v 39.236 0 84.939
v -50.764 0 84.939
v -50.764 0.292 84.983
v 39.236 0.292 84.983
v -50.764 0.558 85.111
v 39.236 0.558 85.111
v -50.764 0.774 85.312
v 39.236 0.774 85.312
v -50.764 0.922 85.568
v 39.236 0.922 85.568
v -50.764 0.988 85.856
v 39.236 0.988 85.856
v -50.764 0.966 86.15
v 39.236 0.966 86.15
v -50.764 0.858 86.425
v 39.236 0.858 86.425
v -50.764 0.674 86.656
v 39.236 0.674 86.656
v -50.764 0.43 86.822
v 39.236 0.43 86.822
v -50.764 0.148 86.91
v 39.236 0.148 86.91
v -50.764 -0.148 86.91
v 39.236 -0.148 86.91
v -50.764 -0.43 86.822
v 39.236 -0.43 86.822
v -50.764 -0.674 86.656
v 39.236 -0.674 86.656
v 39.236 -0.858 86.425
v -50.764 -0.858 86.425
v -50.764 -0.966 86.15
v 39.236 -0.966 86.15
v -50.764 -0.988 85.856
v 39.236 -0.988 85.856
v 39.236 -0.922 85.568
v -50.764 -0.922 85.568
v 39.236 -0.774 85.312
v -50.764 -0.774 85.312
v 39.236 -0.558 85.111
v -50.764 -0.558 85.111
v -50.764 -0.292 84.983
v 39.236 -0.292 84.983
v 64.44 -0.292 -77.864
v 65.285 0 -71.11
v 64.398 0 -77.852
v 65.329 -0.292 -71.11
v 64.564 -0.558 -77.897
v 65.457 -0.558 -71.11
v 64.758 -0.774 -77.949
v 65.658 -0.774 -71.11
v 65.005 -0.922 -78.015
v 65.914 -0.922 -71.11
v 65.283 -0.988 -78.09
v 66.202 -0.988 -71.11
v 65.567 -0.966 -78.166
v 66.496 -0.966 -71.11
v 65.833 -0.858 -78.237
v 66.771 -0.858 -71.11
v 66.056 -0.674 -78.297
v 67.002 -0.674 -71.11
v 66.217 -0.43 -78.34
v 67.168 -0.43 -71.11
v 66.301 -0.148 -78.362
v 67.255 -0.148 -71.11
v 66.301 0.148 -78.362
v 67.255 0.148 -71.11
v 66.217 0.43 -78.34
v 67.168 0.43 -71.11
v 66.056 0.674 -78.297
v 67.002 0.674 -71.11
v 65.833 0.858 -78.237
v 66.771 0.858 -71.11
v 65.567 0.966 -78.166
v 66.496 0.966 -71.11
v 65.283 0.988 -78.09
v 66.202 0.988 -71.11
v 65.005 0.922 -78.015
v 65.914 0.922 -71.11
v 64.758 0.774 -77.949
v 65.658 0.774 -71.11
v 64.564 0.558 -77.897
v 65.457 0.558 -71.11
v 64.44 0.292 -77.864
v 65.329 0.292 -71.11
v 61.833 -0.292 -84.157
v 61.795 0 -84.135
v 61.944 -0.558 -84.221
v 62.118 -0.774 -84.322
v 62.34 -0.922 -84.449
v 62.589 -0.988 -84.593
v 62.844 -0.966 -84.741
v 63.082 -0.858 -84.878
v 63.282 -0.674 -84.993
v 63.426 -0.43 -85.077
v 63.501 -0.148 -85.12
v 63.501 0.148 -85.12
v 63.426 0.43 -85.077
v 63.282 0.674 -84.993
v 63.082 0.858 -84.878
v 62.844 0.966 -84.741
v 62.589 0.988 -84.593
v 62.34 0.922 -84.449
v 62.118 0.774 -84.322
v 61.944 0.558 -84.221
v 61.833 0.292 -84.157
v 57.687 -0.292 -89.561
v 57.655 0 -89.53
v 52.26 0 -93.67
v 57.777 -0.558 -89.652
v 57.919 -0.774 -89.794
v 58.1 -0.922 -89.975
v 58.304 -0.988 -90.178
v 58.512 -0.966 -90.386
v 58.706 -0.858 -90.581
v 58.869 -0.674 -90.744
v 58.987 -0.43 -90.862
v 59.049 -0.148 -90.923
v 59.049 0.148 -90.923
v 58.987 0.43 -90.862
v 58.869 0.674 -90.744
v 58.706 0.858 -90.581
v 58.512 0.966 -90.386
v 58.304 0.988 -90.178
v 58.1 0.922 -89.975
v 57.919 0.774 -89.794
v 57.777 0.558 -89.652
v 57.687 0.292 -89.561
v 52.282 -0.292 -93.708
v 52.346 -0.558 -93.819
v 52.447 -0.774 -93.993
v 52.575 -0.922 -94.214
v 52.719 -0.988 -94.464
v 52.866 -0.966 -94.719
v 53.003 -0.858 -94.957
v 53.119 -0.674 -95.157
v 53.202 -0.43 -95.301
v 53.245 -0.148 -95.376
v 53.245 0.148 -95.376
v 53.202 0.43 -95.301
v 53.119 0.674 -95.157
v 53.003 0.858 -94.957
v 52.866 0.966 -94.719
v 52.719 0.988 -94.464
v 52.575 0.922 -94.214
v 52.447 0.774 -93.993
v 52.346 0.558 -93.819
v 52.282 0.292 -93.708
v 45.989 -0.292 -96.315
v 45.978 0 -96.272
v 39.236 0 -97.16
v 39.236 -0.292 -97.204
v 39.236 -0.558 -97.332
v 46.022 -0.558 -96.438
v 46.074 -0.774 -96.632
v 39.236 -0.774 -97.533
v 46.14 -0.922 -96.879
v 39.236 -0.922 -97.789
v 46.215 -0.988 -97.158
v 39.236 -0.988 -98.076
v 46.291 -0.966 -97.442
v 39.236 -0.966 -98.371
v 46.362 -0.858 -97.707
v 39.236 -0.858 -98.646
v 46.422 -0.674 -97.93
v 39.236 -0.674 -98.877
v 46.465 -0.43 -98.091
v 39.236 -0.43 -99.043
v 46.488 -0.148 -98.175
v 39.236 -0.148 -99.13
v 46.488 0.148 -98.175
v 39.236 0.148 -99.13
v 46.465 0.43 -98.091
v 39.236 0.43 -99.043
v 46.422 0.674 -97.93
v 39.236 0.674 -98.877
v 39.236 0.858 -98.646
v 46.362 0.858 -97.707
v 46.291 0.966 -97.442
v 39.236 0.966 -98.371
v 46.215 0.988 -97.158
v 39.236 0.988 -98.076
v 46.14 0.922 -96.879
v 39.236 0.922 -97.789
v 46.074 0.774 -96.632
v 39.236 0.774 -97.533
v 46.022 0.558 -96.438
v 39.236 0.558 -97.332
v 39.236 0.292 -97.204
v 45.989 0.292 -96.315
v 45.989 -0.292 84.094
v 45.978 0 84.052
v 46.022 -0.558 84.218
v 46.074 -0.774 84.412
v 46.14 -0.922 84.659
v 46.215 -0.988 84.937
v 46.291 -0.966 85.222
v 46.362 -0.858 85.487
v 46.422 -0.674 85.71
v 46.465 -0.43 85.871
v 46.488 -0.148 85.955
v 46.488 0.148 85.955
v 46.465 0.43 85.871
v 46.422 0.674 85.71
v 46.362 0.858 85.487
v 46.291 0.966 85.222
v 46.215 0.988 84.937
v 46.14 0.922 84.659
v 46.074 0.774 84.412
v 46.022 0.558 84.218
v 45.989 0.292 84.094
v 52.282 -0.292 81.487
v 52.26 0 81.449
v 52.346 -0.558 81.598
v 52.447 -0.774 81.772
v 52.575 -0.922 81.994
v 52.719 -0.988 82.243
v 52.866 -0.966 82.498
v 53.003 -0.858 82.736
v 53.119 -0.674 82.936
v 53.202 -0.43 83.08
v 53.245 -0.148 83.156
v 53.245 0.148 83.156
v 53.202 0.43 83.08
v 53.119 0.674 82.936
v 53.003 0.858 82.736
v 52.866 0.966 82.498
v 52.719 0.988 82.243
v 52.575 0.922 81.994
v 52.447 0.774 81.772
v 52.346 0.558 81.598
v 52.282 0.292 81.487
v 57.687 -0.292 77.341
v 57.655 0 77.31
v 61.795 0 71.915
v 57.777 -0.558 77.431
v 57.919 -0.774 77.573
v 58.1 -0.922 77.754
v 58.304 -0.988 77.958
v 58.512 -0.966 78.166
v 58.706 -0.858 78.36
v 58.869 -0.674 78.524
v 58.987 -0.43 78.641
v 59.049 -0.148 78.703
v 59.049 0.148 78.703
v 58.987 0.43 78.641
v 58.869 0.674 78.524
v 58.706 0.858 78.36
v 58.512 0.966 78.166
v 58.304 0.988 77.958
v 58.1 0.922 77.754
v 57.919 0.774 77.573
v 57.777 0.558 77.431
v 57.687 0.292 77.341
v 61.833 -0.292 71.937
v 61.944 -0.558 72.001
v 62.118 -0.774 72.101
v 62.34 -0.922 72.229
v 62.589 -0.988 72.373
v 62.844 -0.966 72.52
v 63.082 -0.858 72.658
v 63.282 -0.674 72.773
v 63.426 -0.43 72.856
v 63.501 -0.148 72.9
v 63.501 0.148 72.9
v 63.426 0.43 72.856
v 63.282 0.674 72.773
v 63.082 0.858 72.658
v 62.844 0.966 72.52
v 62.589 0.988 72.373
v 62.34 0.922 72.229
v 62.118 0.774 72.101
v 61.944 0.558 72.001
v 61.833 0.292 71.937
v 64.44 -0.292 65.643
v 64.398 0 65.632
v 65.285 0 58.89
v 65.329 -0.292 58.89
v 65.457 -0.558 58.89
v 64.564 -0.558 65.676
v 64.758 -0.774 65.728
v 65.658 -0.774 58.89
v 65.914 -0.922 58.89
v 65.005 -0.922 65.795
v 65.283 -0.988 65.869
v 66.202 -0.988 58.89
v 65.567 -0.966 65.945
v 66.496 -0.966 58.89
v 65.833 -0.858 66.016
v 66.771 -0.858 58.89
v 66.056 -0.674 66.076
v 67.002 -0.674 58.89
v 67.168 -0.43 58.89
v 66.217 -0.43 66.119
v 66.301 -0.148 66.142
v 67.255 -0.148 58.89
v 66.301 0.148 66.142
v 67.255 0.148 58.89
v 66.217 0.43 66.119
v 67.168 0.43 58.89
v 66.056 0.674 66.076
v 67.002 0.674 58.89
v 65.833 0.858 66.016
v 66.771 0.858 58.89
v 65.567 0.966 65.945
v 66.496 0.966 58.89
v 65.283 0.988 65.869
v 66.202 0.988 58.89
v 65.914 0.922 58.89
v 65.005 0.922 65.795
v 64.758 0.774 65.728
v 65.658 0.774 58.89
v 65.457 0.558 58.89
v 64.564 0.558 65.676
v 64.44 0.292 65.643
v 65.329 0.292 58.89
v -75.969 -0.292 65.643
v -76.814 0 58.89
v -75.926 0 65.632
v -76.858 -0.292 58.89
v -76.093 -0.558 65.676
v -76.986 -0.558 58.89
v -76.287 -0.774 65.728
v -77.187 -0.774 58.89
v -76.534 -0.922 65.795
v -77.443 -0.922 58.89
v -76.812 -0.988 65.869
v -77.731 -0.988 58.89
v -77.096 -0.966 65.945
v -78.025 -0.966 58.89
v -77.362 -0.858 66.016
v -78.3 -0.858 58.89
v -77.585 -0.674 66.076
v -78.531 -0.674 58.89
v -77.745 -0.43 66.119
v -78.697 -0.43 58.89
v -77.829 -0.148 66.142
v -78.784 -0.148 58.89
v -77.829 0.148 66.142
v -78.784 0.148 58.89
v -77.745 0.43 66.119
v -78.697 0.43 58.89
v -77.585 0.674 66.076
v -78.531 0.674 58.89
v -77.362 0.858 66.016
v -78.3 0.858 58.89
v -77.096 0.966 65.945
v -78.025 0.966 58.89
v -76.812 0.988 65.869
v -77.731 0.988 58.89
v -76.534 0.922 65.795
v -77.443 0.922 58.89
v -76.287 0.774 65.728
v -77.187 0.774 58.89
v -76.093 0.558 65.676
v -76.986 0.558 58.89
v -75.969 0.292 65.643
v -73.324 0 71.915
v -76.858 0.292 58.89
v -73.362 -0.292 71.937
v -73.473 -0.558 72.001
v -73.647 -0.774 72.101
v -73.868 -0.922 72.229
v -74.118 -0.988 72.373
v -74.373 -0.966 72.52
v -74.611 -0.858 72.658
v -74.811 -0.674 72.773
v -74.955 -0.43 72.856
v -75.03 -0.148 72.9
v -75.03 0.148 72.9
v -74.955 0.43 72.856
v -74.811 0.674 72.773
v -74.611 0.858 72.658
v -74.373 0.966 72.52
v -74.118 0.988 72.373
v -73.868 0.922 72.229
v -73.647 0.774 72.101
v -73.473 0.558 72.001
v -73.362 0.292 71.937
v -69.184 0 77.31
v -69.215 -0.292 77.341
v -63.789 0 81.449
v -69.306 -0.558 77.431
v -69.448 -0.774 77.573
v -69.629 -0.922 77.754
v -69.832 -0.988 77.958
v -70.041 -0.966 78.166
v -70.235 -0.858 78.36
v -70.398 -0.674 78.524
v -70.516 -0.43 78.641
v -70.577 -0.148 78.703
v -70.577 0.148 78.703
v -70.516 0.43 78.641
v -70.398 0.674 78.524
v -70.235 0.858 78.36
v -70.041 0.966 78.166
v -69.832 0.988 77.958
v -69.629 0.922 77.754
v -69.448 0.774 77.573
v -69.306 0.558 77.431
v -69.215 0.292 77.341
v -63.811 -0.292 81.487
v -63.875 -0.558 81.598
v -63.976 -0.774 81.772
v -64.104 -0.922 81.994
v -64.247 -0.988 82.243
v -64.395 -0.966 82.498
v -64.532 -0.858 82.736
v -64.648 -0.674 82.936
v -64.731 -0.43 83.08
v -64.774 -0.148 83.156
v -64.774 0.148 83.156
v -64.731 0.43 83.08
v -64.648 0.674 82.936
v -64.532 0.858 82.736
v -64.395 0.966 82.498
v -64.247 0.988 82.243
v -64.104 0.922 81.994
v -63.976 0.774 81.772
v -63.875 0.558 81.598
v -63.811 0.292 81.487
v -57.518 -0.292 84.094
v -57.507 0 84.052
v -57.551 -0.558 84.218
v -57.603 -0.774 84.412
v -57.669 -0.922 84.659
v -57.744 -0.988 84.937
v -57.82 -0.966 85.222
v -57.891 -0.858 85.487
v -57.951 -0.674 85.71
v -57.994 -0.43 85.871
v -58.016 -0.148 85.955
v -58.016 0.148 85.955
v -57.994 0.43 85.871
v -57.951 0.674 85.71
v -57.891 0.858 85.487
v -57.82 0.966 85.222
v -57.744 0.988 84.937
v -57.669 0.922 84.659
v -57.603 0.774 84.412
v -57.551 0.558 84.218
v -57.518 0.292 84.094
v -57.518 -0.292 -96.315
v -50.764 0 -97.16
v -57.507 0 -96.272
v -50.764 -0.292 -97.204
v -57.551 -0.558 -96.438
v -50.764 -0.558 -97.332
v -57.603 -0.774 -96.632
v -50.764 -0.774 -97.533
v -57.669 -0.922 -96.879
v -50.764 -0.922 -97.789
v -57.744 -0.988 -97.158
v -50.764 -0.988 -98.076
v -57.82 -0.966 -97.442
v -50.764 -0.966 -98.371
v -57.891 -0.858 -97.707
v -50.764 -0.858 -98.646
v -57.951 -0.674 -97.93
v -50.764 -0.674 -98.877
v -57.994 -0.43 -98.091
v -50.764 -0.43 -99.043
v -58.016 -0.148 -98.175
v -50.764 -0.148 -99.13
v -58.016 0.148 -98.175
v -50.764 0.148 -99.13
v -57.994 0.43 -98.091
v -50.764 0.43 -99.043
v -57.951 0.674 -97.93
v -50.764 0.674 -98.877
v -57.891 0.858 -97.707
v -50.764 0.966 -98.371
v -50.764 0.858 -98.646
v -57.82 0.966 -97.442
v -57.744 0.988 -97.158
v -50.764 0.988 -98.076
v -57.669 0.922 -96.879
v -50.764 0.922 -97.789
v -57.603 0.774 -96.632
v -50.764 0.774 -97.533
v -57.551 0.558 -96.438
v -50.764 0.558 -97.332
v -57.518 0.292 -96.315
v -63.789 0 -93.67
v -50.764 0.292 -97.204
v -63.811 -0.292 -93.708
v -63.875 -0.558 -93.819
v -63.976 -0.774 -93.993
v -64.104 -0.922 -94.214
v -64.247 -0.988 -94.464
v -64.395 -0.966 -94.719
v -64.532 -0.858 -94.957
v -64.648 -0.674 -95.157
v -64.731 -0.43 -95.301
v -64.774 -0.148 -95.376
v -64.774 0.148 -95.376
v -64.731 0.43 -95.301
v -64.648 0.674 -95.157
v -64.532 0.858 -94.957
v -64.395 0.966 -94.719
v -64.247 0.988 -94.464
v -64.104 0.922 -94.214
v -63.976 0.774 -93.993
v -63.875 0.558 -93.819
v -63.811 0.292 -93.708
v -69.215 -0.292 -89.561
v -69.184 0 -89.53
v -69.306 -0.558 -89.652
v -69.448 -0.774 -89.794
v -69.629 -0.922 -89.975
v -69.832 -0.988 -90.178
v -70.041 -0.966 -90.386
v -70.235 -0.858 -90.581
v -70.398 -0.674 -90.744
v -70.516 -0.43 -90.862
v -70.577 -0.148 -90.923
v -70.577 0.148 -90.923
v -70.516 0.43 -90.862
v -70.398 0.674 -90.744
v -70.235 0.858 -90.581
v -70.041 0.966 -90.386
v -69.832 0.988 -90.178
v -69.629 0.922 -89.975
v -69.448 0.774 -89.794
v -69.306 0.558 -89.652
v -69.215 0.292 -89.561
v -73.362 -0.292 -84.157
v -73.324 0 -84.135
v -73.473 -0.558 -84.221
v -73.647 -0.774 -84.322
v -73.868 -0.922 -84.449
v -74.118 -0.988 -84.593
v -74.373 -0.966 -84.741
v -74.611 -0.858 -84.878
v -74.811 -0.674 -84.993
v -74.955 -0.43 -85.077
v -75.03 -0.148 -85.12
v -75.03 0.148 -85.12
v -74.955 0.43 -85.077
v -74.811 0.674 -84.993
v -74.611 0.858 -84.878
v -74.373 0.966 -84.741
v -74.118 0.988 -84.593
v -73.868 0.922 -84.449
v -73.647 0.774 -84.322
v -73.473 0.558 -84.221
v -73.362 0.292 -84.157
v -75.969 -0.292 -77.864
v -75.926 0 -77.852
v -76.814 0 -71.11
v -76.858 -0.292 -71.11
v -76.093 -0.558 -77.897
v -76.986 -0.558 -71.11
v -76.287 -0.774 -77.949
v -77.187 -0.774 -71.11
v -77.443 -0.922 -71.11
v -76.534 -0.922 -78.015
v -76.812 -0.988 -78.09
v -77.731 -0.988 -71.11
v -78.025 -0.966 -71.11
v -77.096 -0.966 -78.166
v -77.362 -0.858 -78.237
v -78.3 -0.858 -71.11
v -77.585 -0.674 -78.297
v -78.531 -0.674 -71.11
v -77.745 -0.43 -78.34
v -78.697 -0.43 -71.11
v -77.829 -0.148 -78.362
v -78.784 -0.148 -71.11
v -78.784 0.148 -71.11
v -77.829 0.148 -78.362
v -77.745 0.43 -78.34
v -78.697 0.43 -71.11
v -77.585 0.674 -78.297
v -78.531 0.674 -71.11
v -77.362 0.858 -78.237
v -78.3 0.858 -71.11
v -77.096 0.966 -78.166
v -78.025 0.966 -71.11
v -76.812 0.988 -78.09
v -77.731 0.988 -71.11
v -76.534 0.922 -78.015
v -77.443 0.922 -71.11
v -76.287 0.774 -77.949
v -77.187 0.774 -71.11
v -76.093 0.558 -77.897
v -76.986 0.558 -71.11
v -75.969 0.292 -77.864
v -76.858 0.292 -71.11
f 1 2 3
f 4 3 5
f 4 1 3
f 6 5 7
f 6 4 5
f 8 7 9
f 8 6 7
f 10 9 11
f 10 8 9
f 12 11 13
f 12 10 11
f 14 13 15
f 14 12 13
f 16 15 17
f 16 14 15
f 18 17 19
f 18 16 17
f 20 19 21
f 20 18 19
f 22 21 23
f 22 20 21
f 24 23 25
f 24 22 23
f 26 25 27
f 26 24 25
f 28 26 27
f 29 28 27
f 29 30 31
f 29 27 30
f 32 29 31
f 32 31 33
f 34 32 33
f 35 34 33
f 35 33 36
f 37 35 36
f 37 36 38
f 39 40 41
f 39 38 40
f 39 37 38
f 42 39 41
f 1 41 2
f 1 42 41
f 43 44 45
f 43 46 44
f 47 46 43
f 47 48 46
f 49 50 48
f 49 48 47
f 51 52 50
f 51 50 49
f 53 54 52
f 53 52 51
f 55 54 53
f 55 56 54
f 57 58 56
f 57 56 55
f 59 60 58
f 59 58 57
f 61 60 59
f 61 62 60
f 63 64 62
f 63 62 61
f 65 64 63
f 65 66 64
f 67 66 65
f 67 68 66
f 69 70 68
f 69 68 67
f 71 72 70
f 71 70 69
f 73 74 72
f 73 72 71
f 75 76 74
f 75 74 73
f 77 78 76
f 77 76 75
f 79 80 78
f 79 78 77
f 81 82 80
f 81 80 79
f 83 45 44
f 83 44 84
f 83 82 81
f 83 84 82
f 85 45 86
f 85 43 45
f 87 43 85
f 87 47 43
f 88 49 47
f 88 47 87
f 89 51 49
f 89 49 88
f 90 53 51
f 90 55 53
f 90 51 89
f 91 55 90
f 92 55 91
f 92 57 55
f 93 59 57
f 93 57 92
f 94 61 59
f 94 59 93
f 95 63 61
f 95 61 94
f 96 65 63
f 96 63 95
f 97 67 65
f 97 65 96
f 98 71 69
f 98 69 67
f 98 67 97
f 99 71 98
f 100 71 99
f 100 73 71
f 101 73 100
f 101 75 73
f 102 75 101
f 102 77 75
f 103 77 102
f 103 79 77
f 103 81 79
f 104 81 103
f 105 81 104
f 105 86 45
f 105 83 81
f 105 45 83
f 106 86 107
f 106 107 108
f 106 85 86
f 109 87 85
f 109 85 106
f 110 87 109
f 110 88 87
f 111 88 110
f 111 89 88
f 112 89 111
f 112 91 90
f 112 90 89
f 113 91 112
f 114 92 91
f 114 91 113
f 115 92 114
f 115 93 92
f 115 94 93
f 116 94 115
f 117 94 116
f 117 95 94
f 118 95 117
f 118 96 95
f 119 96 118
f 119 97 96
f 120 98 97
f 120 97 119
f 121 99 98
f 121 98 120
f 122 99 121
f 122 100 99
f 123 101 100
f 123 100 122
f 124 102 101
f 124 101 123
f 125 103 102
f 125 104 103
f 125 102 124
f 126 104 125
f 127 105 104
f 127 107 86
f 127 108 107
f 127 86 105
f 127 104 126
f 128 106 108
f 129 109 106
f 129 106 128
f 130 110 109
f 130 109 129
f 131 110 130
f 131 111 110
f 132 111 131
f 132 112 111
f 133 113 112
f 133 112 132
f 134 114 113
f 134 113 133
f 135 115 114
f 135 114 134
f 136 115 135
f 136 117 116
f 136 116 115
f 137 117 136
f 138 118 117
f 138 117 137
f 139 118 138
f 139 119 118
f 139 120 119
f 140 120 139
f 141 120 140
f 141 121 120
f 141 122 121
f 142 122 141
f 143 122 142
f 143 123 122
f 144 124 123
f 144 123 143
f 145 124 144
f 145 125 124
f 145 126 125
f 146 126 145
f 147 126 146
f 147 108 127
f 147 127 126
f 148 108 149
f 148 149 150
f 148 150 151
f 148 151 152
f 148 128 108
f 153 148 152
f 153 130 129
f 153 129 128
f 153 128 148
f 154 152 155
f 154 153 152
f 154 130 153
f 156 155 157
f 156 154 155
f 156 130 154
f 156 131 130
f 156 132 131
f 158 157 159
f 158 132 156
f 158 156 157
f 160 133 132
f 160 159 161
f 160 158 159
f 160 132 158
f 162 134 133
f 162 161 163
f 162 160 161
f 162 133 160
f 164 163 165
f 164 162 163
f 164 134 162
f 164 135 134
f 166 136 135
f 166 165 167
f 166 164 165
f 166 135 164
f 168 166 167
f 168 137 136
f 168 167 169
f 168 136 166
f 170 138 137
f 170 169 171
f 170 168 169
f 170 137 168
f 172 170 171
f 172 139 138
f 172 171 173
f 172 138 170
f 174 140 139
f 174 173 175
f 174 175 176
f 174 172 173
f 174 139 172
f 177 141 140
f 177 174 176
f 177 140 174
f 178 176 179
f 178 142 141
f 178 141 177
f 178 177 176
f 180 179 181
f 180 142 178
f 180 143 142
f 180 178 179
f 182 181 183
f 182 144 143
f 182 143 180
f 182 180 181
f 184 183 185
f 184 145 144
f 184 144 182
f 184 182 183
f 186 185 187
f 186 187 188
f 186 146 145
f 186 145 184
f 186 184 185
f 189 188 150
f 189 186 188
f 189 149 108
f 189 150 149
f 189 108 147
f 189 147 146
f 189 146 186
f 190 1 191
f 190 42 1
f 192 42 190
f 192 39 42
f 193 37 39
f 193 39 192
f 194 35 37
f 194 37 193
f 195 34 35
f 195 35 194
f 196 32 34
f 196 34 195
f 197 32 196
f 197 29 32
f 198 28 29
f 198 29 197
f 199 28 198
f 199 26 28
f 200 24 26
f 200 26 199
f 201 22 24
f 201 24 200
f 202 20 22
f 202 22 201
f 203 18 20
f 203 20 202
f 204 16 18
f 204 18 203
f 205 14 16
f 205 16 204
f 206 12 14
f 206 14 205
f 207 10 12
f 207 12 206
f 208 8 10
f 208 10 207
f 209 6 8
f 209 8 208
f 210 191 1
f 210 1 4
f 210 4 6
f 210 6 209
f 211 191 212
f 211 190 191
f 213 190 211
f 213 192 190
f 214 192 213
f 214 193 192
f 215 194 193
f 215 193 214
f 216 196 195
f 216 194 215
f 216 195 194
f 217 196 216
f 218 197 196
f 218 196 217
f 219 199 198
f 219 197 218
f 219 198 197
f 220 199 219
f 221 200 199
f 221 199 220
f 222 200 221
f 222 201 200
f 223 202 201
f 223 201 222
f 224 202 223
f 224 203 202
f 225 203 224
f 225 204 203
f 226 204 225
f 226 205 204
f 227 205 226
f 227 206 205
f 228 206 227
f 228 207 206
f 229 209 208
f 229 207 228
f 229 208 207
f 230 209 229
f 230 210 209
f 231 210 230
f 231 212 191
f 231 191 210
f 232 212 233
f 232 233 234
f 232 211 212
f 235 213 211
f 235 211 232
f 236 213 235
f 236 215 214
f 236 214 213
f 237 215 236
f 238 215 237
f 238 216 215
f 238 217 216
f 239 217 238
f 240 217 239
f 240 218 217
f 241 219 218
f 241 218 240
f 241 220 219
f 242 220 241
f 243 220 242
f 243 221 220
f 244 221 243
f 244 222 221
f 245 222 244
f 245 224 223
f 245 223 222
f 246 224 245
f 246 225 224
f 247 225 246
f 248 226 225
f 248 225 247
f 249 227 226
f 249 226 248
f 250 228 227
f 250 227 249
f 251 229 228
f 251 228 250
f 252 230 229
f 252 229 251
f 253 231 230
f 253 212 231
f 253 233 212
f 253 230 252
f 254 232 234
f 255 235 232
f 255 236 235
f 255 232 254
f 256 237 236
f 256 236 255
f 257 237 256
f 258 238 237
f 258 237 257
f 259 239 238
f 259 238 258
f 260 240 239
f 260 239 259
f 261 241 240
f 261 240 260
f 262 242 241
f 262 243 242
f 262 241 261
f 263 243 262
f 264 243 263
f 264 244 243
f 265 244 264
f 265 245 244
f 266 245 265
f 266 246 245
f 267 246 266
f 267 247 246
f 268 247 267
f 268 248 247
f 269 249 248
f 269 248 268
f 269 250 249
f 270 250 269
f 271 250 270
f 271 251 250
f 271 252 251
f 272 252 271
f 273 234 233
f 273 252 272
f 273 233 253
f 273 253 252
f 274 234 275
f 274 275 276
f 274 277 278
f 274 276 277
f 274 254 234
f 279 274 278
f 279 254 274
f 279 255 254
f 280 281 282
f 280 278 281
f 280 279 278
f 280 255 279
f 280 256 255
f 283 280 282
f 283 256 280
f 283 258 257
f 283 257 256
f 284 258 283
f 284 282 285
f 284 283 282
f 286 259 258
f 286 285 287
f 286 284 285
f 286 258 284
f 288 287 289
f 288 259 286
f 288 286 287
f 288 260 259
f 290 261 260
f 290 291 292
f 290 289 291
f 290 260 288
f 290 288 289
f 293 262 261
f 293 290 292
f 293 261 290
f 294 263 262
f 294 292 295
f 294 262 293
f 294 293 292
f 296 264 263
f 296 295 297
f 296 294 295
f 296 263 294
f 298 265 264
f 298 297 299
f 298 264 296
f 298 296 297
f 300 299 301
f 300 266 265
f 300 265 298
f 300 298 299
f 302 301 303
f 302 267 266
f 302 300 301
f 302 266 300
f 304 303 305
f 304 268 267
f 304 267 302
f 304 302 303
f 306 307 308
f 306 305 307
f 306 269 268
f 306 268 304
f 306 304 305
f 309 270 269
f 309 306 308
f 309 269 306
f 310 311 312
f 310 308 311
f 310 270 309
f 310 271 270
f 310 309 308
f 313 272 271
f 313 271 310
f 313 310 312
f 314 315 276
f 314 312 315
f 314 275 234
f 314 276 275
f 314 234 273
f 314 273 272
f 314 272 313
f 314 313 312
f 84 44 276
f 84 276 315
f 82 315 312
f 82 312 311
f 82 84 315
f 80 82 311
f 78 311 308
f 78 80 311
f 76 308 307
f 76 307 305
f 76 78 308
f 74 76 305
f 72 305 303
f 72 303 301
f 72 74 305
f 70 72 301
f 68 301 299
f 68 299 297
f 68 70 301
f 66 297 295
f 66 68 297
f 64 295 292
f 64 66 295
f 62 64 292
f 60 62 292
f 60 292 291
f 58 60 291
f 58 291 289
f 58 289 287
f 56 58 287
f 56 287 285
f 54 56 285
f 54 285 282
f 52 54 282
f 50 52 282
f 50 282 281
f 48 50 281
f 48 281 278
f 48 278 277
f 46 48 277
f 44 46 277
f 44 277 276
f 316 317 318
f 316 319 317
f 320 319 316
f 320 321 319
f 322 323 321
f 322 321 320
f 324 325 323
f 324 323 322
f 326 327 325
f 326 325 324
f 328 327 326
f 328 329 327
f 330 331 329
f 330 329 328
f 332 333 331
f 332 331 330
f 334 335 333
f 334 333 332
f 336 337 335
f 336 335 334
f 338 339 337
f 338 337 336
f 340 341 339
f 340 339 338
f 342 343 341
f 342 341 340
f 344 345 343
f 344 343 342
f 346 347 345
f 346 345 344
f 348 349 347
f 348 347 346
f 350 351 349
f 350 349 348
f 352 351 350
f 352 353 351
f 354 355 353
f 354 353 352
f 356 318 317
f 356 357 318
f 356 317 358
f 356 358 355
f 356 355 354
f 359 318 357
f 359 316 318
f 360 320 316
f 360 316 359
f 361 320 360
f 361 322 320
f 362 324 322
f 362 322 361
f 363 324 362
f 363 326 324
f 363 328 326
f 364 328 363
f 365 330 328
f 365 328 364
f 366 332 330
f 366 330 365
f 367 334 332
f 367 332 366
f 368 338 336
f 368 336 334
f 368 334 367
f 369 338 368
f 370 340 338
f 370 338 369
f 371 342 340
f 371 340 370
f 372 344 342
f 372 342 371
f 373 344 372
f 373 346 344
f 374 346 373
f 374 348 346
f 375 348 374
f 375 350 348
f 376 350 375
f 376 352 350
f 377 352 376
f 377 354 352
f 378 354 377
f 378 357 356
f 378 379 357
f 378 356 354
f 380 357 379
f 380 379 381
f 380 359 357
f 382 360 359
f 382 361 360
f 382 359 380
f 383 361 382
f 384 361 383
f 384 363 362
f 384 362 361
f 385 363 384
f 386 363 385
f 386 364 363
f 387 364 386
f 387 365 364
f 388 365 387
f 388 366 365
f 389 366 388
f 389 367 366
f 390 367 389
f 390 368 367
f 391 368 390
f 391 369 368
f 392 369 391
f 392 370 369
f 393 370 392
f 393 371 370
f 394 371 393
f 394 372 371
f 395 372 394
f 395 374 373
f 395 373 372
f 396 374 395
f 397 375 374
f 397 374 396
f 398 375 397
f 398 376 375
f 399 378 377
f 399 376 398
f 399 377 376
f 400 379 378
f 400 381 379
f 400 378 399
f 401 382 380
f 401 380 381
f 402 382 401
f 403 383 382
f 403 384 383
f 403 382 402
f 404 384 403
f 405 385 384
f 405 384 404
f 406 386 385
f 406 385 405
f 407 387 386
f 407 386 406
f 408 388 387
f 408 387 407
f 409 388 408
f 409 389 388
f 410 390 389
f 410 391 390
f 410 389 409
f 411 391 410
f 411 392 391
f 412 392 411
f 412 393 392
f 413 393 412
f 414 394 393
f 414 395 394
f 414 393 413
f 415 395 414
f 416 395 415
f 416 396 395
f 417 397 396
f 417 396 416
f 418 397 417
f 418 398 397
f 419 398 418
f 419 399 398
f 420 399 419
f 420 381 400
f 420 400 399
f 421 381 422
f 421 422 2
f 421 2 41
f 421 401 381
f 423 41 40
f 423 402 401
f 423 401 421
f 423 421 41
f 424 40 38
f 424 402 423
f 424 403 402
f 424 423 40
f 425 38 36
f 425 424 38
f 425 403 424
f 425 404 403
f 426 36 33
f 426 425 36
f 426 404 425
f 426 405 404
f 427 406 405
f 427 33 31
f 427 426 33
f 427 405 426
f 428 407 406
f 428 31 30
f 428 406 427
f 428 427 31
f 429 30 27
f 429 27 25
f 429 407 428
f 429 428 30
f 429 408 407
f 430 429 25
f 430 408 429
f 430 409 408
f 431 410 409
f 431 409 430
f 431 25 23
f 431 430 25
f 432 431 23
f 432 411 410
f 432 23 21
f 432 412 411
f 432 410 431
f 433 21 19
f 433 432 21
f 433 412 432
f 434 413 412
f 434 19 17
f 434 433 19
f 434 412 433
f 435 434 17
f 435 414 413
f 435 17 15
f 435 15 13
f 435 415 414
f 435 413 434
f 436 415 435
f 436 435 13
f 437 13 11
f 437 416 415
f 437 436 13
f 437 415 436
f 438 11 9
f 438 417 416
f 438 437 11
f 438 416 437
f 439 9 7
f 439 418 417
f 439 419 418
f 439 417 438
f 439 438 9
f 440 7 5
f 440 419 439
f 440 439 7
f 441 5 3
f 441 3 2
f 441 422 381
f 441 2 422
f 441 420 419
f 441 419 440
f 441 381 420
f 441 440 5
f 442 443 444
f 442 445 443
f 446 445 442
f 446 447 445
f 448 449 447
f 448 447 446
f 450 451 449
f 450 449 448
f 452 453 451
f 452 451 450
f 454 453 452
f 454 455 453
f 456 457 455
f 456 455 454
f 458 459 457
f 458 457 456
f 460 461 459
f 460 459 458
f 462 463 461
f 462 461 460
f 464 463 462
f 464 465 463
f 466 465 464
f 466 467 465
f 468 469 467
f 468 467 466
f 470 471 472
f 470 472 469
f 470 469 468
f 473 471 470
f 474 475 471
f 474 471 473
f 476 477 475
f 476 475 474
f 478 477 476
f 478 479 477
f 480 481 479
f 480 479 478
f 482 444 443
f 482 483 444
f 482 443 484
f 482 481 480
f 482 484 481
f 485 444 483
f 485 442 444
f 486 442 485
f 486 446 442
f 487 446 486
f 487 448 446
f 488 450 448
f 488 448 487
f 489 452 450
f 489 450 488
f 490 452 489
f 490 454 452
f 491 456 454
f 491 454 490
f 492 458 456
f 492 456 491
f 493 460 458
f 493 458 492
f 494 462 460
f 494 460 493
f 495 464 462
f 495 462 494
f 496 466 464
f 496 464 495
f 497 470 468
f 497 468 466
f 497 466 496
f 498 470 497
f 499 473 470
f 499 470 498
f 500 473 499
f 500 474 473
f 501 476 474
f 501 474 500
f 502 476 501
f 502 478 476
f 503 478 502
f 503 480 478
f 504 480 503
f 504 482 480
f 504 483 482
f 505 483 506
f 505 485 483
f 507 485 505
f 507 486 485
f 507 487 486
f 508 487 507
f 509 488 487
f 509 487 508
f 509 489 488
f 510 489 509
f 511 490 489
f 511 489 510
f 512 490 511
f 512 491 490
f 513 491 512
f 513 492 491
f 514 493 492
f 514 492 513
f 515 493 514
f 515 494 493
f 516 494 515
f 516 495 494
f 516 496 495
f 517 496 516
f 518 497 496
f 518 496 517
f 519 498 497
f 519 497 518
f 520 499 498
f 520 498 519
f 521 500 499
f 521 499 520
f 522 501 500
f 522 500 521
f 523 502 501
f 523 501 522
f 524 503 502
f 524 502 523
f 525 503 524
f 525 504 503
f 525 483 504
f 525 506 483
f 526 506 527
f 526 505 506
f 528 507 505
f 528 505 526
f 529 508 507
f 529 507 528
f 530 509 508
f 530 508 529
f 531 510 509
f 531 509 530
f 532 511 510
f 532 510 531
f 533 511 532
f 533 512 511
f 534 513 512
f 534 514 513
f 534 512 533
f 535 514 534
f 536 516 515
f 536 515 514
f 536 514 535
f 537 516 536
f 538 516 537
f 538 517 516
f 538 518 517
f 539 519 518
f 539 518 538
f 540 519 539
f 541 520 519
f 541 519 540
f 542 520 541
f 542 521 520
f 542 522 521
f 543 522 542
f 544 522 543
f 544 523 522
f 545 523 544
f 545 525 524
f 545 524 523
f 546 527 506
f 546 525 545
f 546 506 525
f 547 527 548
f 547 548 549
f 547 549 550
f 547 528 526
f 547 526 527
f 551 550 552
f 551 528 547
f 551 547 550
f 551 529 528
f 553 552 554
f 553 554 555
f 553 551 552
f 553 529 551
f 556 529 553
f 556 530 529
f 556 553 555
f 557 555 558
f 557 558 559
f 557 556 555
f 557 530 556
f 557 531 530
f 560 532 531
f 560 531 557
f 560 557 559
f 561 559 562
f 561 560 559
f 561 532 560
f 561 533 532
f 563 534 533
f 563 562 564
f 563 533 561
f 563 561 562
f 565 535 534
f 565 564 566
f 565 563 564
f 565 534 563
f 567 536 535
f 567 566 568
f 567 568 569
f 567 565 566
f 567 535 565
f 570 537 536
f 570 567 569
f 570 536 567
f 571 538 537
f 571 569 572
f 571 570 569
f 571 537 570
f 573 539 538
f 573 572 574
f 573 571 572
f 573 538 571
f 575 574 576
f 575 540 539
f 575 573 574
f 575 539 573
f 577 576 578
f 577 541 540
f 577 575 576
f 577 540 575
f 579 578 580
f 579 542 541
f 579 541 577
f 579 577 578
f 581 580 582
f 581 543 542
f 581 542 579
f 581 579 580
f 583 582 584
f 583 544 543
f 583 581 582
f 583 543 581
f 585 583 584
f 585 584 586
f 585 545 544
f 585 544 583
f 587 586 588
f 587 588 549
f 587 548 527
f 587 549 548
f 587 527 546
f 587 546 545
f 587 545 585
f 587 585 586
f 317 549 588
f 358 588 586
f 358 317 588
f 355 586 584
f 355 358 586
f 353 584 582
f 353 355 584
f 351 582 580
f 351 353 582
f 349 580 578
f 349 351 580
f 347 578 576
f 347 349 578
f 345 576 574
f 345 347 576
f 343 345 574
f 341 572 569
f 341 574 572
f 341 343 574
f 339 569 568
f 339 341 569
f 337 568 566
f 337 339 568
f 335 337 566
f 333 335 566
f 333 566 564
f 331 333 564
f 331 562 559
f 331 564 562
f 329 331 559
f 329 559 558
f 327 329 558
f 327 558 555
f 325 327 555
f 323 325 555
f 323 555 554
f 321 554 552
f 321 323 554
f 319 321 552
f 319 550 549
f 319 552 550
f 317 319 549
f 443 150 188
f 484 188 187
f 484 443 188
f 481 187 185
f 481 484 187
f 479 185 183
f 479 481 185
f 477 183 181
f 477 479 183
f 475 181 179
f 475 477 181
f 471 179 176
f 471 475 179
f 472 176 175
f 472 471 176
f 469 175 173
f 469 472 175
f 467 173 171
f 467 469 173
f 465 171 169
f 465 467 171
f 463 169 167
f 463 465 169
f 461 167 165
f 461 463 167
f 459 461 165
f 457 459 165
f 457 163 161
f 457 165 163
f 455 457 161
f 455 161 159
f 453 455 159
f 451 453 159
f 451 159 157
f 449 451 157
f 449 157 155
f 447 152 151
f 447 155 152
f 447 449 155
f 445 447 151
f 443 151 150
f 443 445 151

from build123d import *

# Parameters (mm, degrees)
SKETCH2_R = 0.9906


with BuildPart() as part:
    # Sweep1: sweep along a path in Sketch1
    with BuildLine(Plane(origin=(0, 0, 0), x_dir=(1, 0, 0), z_dir=(0, 1, 0))) as sweep1_path:
        Line((66.275827552, -58.889759794), (66.275827552, 71.110240206))
        ThreePointArc((66.275827552, 71.110240206), (58.355934841, 90.2305526), (39.235622447, 98.150445311))
        Line((39.235622447, 98.150445311), (-50.764377553, 98.150445311))
        ThreePointArc((-50.764377553, 98.150445311), (-69.884689947, 90.2305526), (-77.804582658, 71.110240206))
        Line((-77.804582658, 71.110240206), (-77.804582658, -58.889759794))
        ThreePointArc((-77.804582658, -58.889759794), (-69.884689947, -78.010072188), (-50.764377553, -85.929964899))
        Line((-50.764377553, -85.929964899), (39.235622447, -85.929964899))
        ThreePointArc((39.235622447, -85.929964899), (58.355934841, -78.010072188), (66.275827552, -58.889759794))
    # Sketch2 → Sweep1 (sweep)
    with BuildSketch(Plane(origin=(66.275827552, 0, -71.110240206), x_dir=(-1, 0, 0), z_dir=(0, 0, -1))):
        Circle(SKETCH2_R)
    sweep(path=sweep1_path.line)


solid = part.part
